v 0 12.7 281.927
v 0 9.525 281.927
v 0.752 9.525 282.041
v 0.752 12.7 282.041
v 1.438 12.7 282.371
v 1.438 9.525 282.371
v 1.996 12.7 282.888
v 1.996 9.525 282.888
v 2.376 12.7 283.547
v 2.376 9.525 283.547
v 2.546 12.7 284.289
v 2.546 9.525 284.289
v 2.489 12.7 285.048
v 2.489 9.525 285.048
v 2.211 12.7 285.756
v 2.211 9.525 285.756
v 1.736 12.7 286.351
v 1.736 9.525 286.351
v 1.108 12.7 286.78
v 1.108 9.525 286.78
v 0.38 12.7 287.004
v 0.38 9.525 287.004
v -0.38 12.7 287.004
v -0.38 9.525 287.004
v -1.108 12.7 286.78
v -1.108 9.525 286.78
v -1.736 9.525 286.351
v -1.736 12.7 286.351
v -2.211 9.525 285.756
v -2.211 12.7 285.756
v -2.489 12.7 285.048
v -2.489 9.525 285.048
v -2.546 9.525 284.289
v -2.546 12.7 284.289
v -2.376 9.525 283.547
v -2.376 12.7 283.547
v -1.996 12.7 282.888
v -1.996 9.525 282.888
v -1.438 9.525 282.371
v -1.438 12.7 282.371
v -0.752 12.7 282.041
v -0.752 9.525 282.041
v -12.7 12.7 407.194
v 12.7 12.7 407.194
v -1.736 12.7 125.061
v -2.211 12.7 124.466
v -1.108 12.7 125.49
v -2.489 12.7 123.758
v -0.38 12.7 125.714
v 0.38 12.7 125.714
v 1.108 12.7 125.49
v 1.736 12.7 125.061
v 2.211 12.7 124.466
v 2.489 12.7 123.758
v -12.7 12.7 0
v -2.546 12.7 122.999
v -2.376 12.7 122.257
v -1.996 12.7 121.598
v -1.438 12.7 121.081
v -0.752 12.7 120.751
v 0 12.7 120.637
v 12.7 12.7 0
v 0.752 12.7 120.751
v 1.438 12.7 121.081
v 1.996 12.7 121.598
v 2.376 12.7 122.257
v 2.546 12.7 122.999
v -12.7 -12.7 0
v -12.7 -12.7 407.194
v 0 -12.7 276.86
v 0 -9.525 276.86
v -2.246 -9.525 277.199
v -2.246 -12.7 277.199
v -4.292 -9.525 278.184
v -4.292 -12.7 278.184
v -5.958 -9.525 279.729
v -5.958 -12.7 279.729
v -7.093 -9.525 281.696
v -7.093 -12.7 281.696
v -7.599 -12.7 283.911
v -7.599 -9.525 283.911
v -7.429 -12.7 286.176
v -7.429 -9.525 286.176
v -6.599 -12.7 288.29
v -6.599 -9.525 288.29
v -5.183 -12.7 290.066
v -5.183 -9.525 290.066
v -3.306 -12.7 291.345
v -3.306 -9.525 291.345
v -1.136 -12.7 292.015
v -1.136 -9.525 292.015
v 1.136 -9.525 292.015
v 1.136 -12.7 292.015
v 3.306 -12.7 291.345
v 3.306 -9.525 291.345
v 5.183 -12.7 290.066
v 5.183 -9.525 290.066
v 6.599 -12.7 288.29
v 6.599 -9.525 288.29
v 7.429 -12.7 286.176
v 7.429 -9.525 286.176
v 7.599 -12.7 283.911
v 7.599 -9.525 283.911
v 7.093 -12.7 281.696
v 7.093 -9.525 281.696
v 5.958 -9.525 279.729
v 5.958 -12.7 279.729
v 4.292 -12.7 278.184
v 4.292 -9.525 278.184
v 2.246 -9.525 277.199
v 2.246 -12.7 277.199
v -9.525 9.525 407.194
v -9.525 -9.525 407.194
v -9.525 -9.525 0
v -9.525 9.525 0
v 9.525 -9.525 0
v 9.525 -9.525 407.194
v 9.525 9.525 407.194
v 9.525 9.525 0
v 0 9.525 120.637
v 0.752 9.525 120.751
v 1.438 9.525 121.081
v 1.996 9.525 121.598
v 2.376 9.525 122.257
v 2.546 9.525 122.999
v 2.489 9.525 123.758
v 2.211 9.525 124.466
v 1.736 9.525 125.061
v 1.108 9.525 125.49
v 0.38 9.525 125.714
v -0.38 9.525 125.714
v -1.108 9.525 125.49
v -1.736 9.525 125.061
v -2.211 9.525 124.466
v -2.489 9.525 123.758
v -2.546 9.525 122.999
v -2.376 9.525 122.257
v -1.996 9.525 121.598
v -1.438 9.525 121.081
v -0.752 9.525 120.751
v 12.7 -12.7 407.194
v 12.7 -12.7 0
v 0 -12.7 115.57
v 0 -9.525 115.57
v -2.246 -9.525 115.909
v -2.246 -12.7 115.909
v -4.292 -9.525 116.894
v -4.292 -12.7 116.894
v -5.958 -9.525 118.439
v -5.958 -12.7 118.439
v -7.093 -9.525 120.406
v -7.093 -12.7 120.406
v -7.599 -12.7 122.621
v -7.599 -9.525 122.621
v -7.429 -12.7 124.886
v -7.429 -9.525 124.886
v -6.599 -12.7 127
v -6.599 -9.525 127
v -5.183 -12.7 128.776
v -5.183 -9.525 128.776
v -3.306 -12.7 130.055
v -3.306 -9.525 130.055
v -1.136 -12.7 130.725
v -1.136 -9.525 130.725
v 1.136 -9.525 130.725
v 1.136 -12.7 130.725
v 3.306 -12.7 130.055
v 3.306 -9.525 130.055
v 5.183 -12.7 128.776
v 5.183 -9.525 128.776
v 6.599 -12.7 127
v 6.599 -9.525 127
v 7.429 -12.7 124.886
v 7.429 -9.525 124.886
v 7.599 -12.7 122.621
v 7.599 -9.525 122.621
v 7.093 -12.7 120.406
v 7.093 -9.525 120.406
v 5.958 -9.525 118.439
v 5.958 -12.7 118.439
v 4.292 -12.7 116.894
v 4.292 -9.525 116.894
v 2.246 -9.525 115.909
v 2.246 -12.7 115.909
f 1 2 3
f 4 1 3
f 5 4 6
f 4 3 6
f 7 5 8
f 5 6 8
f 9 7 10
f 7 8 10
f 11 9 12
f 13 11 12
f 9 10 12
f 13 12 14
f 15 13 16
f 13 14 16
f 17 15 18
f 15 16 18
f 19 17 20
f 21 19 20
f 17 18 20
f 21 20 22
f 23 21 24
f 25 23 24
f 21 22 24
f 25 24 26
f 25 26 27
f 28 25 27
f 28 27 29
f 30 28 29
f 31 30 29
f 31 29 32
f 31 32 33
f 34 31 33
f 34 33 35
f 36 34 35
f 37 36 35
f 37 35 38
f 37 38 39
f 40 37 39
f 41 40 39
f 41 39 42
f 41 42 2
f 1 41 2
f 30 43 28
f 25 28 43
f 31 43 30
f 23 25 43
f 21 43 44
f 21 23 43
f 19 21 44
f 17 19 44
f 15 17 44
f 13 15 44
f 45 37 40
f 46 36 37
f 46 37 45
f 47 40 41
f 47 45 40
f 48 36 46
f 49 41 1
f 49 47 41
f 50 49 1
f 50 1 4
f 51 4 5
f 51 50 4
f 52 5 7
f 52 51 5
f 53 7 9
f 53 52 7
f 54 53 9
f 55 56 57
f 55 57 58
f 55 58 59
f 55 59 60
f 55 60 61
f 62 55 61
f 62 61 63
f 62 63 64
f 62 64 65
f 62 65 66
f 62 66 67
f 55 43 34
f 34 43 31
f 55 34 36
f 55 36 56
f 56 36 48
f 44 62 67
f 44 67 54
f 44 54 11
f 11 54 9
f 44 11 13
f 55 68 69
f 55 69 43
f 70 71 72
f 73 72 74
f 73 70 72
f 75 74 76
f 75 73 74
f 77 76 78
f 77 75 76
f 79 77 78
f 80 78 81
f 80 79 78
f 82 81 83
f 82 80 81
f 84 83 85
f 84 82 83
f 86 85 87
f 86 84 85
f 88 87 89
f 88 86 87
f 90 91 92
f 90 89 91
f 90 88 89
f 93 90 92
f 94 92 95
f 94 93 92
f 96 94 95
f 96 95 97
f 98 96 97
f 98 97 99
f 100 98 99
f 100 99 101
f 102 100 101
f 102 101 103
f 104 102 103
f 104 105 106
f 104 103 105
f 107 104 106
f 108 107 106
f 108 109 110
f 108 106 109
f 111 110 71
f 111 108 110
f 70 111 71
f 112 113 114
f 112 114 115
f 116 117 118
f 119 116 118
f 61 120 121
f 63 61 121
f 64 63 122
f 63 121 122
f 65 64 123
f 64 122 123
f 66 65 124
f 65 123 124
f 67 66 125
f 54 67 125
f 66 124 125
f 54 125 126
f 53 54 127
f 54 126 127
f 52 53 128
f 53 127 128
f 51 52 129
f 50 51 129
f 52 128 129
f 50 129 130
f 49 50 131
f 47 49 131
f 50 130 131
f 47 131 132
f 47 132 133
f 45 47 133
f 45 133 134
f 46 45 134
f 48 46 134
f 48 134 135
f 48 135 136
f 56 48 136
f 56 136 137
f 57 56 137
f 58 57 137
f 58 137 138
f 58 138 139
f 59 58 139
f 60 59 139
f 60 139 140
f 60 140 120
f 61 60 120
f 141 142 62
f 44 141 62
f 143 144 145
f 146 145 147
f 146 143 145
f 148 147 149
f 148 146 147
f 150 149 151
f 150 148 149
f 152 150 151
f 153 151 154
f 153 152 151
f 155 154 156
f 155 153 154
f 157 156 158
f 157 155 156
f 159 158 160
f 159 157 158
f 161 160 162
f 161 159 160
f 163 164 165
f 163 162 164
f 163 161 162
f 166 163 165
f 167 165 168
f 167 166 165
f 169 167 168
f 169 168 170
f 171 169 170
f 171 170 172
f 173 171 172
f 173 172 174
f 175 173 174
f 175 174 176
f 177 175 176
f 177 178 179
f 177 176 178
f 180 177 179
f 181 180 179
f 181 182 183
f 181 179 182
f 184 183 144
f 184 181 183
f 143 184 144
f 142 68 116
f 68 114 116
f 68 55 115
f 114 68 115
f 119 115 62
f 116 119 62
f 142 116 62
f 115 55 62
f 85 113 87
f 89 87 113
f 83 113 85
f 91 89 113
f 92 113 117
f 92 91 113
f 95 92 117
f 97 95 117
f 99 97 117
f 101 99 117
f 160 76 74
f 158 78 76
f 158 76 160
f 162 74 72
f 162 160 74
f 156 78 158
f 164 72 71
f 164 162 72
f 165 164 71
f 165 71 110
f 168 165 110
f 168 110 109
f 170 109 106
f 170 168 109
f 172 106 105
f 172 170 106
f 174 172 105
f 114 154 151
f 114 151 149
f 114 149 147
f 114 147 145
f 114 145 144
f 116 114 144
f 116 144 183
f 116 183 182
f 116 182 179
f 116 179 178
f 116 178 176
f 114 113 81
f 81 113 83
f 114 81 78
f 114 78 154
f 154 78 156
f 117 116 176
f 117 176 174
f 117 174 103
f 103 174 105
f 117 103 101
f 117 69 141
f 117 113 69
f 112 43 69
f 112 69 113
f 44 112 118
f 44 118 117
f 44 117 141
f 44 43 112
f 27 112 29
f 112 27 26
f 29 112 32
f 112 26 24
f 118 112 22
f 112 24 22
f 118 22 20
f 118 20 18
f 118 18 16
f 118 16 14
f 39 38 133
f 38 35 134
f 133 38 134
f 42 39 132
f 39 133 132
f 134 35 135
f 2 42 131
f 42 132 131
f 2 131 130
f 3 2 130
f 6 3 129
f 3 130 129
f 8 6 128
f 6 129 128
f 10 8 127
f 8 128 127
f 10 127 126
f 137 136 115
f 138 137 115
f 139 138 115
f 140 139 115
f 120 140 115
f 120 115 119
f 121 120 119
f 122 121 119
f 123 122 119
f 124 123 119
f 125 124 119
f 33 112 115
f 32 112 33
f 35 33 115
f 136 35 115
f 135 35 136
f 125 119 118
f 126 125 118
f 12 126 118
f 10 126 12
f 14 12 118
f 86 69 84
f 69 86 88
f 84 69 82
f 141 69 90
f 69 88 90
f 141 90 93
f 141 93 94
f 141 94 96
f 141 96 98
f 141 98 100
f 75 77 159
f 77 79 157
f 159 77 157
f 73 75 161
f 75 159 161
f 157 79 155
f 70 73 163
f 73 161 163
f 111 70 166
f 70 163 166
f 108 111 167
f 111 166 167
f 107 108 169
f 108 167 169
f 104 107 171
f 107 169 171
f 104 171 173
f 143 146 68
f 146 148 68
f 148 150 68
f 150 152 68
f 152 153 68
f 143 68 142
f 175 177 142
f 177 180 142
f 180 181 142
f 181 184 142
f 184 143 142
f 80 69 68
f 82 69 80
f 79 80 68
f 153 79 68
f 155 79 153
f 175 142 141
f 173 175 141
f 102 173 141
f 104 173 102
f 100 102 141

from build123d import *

# Parameters (mm, degrees)
SKETCH1_W              = 25.4
SKETCH1_H              = 25.4
SKETCH1_W_2            = 19.05
SKETCH1_H_2            = 19.05
BOSS_EXTRUDE1_DEPTH    = 407.19375
F_10_CLEARANCE_HOLE1_D = 5.1054
CUT_EXTRUDE1_REACH     = 410.183
SKETCH4_R              = 7.62


with BuildPart() as part:
    # Sketch1 → Boss-Extrude1 (new body)
    with BuildSketch(Plane.XY):
        Rectangle(SKETCH1_W, SKETCH1_H)
        Rectangle(SKETCH1_W_2, SKETCH1_H_2, mode=Mode.SUBTRACT)
    extrude(amount=BOSS_EXTRUDE1_DEPTH)

    # #10 Clearance Hole1 (through all)
    with Locations(Plane(origin=(146.05, 12.7, 546.735), x_dir=(0, 0, 1), z_dir=(0, 1, 0))):
        with Locations((-423.545, -146.05), (-262.255, -146.05)):
            Hole(F_10_CLEARANCE_HOLE1_D / 2)

    # Sketch4 → Cut-Extrude1 (cut, up to next)
    with BuildSketch(Plane(origin=(0, -12.7, 0), x_dir=(1, 0, 0), z_dir=(0, 1, 0)), mode=Mode.PRIVATE) as cut_extrude1_sk1:
        with Locations(Location((0, -123.19, 0), (0, 0, 90))):
            Circle(SKETCH4_R)
    cut_extrude1_tool1 = extrude(cut_extrude1_sk1.sketch, amount=CUT_EXTRUDE1_REACH, mode=Mode.PRIVATE) & part.part
    # Sketch4 → Cut-Extrude1 (cut, up to next)
    with BuildSketch(Plane(origin=(0, -12.7, 0), x_dir=(1, 0, 0), z_dir=(0, 1, 0)), mode=Mode.PRIVATE) as cut_extrude1_sk2:
        with Locations(Location((0, -284.48, 0), (0, 0, 90))):
            Circle(SKETCH4_R)
    cut_extrude1_tool2 = extrude(cut_extrude1_sk2.sketch, amount=CUT_EXTRUDE1_REACH, mode=Mode.PRIVATE) & part.part
    add(cut_extrude1_tool1.solids().sort_by_distance((0, -12.7, 123.19))[0], mode=Mode.SUBTRACT)
    add(cut_extrude1_tool2.solids().sort_by_distance((0, -12.7, 284.48))[0], mode=Mode.SUBTRACT)


solid = part.part
